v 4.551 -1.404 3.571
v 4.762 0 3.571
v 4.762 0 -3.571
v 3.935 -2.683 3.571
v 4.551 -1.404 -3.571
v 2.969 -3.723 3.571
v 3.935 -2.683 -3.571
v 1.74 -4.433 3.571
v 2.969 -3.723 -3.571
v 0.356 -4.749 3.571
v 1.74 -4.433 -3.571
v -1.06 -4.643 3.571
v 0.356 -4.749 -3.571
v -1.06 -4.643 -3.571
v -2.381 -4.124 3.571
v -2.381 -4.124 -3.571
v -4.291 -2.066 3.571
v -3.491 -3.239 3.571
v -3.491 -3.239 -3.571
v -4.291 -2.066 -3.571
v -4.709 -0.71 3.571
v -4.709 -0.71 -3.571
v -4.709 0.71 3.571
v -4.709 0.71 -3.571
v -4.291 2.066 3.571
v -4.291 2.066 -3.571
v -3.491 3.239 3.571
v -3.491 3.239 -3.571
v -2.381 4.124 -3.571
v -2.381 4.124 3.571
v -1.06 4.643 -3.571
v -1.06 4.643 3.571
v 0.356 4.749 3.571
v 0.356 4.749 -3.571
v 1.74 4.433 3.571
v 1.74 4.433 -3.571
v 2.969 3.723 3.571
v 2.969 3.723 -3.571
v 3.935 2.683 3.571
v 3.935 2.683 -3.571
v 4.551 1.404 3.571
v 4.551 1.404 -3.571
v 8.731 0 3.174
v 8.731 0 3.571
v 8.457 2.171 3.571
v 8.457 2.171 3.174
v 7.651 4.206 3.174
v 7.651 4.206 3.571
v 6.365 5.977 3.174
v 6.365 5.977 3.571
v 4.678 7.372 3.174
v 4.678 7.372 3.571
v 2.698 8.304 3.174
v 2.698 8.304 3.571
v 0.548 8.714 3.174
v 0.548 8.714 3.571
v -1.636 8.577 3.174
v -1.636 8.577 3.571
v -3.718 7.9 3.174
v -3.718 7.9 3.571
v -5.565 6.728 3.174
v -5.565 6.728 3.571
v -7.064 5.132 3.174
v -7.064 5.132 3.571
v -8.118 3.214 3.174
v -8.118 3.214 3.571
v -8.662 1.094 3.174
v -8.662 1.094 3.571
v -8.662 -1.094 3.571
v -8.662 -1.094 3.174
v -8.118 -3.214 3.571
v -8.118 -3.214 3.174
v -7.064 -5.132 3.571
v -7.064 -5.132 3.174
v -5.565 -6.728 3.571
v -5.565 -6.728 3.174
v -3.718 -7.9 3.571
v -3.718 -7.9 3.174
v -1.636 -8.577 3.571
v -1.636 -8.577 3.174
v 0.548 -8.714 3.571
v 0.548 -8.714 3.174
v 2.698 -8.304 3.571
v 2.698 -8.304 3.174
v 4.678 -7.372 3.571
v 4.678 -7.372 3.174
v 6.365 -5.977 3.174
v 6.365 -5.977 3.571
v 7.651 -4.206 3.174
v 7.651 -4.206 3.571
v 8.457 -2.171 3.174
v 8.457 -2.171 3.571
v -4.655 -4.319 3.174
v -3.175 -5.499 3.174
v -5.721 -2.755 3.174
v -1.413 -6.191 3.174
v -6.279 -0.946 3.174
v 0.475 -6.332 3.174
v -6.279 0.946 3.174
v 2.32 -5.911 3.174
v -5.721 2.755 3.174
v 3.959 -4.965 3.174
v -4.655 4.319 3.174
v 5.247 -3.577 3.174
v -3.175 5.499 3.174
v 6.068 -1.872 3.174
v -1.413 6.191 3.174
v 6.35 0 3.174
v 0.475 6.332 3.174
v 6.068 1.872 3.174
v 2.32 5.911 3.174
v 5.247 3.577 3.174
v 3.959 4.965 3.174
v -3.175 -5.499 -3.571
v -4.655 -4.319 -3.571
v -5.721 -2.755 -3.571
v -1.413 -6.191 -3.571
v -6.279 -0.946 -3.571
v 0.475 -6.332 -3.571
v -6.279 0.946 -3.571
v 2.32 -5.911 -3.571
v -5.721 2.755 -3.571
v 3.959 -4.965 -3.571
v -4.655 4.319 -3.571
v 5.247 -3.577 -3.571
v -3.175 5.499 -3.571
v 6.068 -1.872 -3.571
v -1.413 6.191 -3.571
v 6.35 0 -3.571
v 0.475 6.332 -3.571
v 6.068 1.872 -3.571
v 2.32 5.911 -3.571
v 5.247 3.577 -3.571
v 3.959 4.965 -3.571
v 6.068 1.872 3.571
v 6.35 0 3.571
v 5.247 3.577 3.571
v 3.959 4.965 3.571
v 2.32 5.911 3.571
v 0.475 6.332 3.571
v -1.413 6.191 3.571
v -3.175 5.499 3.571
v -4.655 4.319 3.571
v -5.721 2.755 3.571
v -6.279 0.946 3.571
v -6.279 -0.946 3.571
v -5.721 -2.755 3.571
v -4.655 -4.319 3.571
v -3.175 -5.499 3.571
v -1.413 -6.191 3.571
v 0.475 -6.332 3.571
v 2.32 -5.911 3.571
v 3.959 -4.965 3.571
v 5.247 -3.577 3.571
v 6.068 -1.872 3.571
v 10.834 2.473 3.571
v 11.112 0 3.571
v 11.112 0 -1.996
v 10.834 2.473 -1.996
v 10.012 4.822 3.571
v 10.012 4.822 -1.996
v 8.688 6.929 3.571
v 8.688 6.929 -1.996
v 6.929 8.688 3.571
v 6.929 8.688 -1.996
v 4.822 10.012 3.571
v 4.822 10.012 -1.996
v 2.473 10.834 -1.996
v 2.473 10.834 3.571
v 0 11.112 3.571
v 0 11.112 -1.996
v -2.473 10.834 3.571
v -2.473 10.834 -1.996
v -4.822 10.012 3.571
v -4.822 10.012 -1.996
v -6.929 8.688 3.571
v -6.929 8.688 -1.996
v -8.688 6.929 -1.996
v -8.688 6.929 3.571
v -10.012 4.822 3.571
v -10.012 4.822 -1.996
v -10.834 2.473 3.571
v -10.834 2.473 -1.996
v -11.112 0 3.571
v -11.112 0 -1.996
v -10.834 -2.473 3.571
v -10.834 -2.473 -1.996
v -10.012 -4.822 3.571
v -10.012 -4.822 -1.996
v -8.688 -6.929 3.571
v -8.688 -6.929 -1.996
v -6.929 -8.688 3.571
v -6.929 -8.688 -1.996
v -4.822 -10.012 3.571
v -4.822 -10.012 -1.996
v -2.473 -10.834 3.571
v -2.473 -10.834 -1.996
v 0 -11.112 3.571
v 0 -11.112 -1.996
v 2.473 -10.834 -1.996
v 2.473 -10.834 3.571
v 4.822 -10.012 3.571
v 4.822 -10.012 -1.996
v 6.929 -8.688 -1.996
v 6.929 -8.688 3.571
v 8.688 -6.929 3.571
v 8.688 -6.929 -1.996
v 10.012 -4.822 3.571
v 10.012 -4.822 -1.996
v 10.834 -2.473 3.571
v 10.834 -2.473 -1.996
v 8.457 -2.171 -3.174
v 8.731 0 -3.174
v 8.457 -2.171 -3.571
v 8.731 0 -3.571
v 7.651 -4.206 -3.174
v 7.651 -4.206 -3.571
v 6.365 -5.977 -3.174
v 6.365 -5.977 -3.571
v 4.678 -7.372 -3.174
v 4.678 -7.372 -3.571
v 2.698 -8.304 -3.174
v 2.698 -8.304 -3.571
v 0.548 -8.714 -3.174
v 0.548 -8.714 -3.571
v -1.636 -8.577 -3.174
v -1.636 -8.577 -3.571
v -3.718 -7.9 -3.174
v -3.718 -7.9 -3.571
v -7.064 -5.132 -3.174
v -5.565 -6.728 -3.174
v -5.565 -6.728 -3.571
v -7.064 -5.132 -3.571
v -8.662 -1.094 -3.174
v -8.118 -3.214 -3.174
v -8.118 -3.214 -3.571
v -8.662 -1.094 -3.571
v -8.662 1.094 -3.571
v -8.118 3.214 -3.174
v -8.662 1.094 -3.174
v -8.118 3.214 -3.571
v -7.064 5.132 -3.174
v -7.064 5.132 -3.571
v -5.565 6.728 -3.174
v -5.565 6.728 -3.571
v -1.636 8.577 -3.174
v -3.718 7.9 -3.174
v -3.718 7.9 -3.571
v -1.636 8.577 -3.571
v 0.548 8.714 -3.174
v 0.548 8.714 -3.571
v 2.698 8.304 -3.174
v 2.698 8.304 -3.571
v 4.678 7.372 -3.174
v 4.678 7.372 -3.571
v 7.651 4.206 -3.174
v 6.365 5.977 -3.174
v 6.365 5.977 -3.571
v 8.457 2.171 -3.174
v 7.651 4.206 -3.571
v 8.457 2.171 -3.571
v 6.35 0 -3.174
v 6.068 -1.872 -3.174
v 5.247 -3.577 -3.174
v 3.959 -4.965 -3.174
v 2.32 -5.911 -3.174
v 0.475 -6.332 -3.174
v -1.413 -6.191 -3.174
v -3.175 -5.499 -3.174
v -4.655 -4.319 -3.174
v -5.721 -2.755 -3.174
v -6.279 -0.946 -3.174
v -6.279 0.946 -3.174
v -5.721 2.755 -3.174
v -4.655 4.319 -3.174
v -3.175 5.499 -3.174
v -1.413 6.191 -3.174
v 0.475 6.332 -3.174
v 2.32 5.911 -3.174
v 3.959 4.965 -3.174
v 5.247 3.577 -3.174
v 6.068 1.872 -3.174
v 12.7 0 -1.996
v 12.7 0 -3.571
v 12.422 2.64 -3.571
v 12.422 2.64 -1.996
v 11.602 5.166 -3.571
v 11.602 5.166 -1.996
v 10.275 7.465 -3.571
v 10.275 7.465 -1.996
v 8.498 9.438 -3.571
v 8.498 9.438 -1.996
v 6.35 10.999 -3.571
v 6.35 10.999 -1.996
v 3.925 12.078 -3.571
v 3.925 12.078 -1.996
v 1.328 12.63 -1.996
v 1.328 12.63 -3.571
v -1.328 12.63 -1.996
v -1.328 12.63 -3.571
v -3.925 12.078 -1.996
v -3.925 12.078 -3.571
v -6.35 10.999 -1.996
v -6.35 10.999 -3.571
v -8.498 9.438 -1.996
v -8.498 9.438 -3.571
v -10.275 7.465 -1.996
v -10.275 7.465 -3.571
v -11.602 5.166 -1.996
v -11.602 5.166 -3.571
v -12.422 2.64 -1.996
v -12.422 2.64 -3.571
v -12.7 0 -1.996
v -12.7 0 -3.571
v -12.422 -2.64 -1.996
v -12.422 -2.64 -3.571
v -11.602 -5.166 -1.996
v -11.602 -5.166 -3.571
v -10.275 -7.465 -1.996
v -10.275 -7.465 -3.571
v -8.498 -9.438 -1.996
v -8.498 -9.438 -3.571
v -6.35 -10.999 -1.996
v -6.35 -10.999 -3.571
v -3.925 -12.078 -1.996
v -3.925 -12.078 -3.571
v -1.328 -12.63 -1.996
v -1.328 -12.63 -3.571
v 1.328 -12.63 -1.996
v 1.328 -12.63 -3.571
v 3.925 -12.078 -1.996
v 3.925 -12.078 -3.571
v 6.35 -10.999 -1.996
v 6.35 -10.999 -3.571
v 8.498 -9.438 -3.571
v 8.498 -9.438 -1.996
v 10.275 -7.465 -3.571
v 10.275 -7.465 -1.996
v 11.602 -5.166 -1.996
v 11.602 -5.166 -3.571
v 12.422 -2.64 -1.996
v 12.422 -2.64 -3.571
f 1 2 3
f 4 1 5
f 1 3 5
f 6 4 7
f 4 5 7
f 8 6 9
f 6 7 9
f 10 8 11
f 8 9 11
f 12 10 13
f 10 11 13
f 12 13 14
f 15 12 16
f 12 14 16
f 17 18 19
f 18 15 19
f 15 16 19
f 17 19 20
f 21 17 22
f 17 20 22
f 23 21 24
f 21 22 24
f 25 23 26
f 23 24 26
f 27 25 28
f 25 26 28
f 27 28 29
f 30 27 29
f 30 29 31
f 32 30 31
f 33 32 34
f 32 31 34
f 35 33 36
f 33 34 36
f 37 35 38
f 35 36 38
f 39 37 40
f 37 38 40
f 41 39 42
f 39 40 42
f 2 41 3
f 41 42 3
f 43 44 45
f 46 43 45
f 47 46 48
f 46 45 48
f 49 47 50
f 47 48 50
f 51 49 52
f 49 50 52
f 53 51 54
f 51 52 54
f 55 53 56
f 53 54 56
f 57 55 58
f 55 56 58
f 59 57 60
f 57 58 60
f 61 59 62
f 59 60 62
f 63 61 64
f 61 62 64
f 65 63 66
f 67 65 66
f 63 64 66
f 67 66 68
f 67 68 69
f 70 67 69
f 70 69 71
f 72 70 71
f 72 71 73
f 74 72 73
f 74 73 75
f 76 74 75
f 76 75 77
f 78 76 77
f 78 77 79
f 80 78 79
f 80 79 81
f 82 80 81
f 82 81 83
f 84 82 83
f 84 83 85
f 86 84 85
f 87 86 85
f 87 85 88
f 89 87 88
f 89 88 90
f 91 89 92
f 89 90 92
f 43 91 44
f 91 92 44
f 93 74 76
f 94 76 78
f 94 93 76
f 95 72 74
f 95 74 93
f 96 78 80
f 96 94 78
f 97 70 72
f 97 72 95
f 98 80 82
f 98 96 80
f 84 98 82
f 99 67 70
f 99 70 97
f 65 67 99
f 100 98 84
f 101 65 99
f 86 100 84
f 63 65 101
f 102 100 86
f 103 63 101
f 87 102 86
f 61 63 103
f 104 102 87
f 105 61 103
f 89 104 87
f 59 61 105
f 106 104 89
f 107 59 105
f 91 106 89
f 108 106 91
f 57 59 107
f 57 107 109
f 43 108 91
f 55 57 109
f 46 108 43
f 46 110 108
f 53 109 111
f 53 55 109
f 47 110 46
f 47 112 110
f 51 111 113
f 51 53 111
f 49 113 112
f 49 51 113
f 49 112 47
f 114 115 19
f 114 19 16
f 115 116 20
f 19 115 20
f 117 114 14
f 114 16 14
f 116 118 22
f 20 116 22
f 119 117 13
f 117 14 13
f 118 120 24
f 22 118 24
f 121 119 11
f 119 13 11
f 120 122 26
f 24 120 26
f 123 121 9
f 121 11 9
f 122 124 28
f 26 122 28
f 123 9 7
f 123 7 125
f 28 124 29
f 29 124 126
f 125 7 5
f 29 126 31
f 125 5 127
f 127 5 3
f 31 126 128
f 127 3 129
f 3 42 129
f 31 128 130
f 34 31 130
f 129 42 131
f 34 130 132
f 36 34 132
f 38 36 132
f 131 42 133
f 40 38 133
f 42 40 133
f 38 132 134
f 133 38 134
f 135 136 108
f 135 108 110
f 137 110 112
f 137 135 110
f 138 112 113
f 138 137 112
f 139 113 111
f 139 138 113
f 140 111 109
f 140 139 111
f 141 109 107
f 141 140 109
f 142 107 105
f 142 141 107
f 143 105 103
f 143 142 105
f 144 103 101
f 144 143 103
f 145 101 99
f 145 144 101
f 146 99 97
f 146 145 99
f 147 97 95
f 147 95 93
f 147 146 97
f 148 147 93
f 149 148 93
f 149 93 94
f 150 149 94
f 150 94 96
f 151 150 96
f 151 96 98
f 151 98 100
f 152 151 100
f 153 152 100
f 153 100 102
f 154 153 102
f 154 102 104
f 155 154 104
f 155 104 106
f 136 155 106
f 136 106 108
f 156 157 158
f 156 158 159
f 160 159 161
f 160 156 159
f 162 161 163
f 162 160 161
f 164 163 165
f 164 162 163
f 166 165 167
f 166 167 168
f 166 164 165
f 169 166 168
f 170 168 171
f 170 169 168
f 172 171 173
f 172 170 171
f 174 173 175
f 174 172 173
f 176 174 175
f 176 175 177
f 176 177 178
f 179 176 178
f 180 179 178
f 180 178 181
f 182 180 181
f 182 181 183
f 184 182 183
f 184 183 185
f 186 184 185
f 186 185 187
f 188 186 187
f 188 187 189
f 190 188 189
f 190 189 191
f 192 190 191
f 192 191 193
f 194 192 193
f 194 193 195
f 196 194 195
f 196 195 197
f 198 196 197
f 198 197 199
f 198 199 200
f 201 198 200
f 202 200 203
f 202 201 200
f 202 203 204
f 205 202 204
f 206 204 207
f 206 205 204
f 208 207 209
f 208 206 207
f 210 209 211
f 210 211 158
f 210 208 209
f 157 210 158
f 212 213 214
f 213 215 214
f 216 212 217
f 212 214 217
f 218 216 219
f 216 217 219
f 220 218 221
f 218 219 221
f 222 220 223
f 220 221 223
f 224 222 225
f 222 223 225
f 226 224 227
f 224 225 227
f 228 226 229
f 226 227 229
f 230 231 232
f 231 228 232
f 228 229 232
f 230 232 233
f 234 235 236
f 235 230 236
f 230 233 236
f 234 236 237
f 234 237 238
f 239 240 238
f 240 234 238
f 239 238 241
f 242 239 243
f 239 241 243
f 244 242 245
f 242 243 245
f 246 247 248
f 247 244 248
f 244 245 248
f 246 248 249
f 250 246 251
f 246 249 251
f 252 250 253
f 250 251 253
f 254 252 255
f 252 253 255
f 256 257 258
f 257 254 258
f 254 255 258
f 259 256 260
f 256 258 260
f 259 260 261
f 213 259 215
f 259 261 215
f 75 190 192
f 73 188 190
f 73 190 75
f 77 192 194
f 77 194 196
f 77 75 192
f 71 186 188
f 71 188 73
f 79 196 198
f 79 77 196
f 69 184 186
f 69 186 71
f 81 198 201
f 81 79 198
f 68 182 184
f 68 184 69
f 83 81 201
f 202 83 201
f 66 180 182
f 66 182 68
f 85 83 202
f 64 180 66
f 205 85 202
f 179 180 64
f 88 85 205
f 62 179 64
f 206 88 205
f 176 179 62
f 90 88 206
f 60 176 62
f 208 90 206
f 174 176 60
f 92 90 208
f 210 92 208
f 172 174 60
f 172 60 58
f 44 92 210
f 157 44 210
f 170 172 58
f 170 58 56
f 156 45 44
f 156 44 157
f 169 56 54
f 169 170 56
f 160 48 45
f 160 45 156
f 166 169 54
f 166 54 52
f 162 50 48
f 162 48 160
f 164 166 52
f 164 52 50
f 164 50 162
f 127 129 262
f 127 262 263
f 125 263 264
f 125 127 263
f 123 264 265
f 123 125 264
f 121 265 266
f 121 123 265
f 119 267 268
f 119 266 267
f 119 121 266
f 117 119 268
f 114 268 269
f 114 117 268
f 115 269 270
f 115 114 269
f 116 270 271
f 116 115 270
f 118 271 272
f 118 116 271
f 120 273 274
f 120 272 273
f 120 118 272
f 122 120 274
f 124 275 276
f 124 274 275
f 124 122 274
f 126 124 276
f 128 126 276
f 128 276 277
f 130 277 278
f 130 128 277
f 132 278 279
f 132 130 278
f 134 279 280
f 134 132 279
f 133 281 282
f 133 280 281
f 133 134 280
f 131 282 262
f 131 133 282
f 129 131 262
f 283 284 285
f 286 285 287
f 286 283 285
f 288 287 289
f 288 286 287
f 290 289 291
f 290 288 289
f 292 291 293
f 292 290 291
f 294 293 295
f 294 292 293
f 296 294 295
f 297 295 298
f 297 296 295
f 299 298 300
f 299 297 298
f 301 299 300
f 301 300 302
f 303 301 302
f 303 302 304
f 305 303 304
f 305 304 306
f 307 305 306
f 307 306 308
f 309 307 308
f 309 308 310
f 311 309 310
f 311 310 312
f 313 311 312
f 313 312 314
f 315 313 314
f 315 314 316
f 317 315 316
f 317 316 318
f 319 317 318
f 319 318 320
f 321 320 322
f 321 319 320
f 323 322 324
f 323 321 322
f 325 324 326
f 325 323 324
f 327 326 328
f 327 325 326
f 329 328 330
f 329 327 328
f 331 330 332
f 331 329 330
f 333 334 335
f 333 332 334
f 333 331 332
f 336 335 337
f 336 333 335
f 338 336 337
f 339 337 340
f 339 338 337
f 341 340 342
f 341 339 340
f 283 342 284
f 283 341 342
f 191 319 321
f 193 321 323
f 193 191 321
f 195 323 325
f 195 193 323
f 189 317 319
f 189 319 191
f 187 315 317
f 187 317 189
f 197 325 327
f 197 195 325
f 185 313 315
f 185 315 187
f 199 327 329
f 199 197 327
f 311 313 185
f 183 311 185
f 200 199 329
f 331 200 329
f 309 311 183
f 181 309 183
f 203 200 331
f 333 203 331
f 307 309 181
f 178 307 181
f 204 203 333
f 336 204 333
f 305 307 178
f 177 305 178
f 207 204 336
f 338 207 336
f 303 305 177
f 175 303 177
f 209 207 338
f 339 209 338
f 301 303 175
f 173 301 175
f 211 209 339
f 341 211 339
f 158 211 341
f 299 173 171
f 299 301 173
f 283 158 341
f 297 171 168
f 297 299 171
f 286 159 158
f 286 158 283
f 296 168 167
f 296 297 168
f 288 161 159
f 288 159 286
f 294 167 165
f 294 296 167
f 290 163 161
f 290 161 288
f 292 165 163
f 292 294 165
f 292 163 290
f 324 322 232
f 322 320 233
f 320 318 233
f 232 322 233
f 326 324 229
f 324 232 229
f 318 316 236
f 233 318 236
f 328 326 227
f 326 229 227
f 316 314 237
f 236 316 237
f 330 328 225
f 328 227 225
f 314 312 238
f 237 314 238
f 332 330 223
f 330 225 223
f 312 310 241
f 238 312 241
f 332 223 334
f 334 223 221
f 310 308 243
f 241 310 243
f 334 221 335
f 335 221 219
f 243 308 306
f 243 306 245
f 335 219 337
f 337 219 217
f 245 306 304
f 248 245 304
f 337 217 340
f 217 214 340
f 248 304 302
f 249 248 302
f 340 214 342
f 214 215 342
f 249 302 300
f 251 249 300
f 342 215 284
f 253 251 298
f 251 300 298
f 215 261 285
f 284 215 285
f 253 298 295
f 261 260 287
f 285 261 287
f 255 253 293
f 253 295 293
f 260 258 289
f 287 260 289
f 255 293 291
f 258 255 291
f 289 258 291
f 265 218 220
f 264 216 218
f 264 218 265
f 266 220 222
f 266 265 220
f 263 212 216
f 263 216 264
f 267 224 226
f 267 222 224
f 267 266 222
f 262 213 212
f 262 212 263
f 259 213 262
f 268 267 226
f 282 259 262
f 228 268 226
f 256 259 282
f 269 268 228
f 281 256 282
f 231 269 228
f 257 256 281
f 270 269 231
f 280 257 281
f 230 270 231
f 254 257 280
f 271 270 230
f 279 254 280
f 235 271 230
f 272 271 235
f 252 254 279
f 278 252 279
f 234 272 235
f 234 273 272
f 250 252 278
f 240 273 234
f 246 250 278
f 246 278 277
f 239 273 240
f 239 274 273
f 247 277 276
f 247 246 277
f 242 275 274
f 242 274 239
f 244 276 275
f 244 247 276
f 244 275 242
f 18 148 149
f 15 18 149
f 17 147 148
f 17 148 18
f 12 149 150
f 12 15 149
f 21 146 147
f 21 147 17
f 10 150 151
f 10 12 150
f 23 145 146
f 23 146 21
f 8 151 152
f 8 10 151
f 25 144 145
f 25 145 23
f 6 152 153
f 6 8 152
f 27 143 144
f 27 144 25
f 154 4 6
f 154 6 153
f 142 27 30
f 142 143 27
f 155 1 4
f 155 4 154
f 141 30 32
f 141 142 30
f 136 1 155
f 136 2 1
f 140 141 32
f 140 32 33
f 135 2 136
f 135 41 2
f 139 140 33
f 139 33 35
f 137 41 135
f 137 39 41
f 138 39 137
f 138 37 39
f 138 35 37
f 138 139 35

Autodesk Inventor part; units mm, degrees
ref_plane "YZ Plane" through (0, 0, 0) normal (1, 0, 0) x (0, 1, 0)
ref_plane "XZ Plane" through (0, 0, 0) normal (0, 1, 0) x (-1, 0, 0)
ref_plane "XY Plane" through (0, 0, 0) normal (0, 0, 1) x (1, 0, 0)
sketch "Sketch1" plane through (0, 0, 0) normal (0, 0, 1) x (1, 0, 0)
  line L0 (-17.78, 0) -> (17.78, 0) projected
  line L1 (0, -17.78) -> (0, 17.78) projected
  circle A0 centre (0, 0) radius 12.7
  circle A1 centre (0, 0) radius 4.7625
  dimension "d0" = 9.525
  dimension "d1" = 25.4
extrude "Base" add sketch "Sketch1" along normal mid plane 7.1425 contours A1 L1 A0 L0 | L0 A0 L1 A1 | A1 L0 A0 L1 | L1 A0 L0 A1
sketch "Sketch2" plane through (0, 0, 3.5712) normal (0, 0, 1) x (1, 0, 0)
  circle A0 centre (0, 0) radius 12.7 projected
  circle A1 centre (0, 0) radius 11.1125
  dimension "d4" = 22.225
extrude "Flange Cutaway" cut sketch "Sketch2" against normal blind 5.5677
sketch "Sketch3" plane through (0, 0, 3.5712) normal (0, 0, 1) x (1, 0, 0)
  circle A0 centre (0, 0) radius 11.1125 projected
  circle A1 centre (0, 0) radius 4.7625 projected
  circle A2 centre (0, 0) radius 6.35
  circle A3 centre (0, 0) radius 8.7312
  dimension "d7" = 1.5875
  dimension "d8" = 2.3813
extrude "Cutaway" cut sketch "Sketch3" against normal blind 0.3969 contours A3
mirror "Mirror1" about plane through (0, 0, 0) normal (0, 0, 1) of "Cutaway"
properties part number "bearing_1.125OD" material "Steel"
